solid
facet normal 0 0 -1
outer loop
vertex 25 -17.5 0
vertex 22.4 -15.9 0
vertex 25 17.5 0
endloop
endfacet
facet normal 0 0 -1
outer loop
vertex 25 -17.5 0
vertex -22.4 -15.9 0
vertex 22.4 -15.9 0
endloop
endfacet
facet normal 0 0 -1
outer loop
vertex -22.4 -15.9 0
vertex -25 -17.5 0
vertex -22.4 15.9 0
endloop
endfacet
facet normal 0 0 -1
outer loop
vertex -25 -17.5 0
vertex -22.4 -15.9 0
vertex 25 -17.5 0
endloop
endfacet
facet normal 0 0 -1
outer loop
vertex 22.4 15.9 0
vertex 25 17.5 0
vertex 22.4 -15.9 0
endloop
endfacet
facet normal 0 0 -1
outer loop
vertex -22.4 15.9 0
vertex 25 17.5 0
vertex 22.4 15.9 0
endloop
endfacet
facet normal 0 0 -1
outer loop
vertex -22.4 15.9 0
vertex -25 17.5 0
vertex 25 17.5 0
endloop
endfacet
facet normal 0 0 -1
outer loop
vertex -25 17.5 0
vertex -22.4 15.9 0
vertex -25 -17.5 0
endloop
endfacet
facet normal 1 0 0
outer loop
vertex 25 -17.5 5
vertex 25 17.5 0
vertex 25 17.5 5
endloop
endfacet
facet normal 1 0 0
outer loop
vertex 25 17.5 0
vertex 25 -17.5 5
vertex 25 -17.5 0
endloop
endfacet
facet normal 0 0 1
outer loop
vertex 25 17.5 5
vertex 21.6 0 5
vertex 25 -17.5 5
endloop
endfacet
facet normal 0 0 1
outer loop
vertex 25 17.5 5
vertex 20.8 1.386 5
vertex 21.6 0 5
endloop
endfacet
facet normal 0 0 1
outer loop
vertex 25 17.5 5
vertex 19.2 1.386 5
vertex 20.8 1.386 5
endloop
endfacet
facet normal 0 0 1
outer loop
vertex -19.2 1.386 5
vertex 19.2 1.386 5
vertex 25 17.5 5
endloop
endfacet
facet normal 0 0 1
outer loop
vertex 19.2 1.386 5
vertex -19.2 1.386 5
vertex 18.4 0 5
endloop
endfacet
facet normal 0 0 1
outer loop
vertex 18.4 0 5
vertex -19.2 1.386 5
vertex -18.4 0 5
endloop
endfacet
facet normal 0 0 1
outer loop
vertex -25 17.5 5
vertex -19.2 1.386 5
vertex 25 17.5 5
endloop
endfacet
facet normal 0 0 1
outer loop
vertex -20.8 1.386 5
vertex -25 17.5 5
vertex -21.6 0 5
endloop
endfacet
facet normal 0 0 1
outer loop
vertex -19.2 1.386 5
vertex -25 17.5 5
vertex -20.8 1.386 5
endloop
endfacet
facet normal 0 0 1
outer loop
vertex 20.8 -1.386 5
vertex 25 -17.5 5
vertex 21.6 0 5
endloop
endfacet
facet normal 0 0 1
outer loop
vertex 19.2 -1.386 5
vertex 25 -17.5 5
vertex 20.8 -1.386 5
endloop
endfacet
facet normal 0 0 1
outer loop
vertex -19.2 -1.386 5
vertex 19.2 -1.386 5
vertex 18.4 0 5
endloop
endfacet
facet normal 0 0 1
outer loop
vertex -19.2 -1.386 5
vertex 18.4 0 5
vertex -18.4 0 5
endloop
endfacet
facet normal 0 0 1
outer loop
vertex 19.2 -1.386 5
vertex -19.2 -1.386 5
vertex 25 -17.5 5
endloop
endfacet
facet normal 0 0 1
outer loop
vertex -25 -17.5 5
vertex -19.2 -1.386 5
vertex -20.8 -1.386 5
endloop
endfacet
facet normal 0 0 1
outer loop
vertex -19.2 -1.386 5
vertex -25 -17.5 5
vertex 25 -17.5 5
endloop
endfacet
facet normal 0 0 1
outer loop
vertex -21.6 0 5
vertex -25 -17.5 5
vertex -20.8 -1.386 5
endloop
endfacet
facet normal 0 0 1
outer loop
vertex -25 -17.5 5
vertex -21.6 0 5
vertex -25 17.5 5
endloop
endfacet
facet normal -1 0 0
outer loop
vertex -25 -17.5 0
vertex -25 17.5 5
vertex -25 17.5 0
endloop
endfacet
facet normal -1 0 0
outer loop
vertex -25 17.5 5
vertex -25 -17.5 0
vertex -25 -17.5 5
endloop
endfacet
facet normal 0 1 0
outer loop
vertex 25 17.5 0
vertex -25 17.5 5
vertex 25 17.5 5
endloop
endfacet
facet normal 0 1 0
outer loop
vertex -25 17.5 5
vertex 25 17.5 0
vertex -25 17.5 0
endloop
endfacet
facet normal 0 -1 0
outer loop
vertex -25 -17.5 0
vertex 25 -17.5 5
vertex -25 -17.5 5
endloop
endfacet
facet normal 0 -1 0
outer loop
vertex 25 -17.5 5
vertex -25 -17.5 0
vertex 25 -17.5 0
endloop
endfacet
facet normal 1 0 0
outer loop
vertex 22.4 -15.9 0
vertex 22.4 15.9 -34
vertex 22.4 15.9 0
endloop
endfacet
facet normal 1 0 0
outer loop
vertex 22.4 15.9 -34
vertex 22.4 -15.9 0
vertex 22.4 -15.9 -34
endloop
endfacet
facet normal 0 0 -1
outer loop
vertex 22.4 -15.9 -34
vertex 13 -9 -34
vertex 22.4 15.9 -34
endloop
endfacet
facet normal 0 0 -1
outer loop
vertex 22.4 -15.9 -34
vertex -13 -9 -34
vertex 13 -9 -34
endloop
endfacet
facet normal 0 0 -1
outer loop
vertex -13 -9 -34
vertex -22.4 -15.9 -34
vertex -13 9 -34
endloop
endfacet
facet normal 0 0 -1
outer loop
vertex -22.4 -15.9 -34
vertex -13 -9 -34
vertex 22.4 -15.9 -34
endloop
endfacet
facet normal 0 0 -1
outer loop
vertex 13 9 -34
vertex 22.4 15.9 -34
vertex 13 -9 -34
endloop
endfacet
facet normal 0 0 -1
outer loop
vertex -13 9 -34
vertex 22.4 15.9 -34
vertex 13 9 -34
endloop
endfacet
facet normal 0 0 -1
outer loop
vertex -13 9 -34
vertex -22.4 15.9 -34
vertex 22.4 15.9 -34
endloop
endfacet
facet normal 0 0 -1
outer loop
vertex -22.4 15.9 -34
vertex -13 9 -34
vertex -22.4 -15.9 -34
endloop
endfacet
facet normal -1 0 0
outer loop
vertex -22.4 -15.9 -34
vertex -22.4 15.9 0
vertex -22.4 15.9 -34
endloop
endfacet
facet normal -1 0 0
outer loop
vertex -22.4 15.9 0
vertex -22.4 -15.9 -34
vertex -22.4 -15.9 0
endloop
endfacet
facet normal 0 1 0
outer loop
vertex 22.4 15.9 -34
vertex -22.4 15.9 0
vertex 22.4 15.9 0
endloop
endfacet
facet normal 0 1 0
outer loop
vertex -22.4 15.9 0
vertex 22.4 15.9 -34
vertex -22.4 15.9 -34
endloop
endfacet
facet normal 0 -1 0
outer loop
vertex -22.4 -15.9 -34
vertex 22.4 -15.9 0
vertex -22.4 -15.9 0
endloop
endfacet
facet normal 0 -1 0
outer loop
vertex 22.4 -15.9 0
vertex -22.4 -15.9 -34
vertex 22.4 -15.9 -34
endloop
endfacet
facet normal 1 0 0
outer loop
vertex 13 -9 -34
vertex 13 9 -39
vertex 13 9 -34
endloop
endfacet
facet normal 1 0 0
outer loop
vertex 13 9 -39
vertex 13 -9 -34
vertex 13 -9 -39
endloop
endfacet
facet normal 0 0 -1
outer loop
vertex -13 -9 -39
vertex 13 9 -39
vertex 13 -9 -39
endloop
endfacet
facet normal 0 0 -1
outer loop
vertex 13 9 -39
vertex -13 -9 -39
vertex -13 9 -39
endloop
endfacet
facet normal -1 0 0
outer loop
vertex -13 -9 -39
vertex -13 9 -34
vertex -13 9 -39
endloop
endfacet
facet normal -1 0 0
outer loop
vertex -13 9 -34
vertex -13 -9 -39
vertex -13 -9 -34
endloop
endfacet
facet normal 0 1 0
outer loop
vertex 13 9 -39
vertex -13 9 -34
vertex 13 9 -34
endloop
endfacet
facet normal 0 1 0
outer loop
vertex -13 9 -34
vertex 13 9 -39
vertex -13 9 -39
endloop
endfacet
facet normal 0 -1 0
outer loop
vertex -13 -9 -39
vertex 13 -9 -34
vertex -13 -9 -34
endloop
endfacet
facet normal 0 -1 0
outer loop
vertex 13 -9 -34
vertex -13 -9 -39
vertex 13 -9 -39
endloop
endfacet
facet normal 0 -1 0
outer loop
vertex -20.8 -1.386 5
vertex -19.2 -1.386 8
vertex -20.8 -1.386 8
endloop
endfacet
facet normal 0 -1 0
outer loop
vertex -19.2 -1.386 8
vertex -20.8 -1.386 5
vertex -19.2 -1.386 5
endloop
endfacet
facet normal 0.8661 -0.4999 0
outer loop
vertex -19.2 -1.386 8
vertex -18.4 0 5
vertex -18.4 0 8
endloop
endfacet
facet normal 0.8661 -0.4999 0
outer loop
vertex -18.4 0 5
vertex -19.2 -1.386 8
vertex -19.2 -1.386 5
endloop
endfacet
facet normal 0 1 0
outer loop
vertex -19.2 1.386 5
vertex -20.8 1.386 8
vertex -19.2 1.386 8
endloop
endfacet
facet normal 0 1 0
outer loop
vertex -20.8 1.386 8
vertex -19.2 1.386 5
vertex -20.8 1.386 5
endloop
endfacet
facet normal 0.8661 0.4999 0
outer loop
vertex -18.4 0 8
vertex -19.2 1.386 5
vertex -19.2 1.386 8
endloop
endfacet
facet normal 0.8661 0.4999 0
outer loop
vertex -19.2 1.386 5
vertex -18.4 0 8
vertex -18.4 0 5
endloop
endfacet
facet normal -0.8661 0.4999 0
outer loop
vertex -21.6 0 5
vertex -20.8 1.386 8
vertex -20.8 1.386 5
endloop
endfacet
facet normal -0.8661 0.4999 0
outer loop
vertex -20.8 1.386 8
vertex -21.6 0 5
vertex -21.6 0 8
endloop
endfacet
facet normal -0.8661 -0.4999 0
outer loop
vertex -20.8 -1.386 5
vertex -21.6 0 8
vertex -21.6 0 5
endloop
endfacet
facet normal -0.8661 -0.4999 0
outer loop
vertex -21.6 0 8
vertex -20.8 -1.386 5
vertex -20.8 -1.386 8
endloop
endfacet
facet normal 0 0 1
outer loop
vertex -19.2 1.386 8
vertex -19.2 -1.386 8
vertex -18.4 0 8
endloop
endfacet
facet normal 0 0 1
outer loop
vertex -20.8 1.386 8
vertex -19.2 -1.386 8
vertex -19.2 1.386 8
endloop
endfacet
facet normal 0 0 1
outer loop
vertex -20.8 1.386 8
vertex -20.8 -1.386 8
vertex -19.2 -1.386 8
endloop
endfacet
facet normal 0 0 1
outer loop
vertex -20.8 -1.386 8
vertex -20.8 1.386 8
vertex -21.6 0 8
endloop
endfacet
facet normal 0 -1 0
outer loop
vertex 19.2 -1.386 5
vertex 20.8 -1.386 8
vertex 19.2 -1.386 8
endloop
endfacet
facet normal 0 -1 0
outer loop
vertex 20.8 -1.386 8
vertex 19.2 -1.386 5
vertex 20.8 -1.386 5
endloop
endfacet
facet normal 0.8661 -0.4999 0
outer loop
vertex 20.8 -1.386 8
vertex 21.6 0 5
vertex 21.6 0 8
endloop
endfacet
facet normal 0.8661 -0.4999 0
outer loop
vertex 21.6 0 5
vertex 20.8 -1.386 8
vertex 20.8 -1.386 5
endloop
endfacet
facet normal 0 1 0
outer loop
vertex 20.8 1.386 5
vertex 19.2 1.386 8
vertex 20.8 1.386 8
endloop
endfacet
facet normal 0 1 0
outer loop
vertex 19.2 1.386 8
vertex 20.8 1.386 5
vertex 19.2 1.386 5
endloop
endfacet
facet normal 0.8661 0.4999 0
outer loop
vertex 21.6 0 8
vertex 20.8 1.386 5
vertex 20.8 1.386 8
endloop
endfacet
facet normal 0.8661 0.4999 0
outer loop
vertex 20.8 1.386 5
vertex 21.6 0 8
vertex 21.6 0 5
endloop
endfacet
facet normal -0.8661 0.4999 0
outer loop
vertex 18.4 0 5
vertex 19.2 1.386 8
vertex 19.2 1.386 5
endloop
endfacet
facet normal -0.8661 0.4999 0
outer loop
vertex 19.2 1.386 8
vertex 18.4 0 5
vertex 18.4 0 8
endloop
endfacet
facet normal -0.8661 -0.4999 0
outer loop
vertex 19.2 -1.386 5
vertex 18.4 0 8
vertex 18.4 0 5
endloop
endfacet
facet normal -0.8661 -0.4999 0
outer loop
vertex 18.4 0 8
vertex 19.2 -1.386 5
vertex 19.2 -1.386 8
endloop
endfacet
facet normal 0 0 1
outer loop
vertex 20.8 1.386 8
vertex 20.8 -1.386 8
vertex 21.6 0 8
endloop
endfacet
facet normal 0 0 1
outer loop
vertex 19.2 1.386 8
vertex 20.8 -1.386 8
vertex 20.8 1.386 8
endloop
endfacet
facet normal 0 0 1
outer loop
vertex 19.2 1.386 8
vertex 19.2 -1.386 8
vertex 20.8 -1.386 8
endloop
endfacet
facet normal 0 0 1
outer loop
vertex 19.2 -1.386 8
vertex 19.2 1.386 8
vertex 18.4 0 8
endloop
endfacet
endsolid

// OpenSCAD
// Parameters
cutout_width_mm = 40.0; //[20.0:80.0:0.5]
cutout_height_mm = 27.0; //[13.5:54.0:0.5]
panel_thickness_mm = 2.0; //[1.0:4.0:0.25]
fit_clearance_mm = 0.4; //[0.1:1.0:0.05]
overlap_mm = 1.0; //[0.5:2.0:0.1]
flange_width_mm = 50.0; //[40.0:80.0:0.5]
flange_height_mm = 35.0; //[27.0:70.0:0.5]
flange_thickness_mm = 3.0; //[1.5:6.0:0.25]
bezel_thickness_mm = 2.0; //[1.0:5.0:0.25]
bezel_radius_mm = 2.5; //[0.5:6.0:0.25]
body_depth_mm = 28.0; //[14.0:56.0:0.5]
body_wall_extra_mm = 2.0; //[1.0:5.0:0.25]
screw_hole_diameter_mm = 3.2; //[2.0:6.0:0.1]
screw_hole_pitch_mm = 40.0; //[25.0:70.0:0.5]
screw_hole_edge_margin_mm = 6.0; //[3.0:12.0:0.5]
terminal_clearance_width_mm = 26.0; //[15.0:45.0:0.5]
terminal_clearance_height_mm = 18.0; //[10.0:35.0:0.5]
terminal_clearance_depth_mm = 12.0; //[6.0:30.0:0.5]
rear_clearance_extra_depth_mm = 6.0; //[2.0:20.0:0.5]

// IEC Module - complete geometry
module iec() {
  color("Black") {
    // Body
    translate([0, 0, -(panel_thickness_mm/2 + (body_depth_mm + overlap_mm)/2 - overlap_mm)])
      cube([cutout_width_mm + 2*body_wall_extra_mm, cutout_height_mm + 2*body_wall_extra_mm, body_depth_mm + overlap_mm], center=true);
    // Front Flange Bezel
    translate([0, 0, (panel_thickness_mm/2 + (flange_thickness_mm + bezel_thickness_mm)/2 - overlap_mm)])
      cube([flange_width_mm, flange_height_mm, flange_thickness_mm + bezel_thickness_mm], center=true);
  }
}

// Mod Module - complete geometry
module mod() {
  color("DimGray") {
    // Rear Body Clearance Volume
    translate([0, 0, -(panel_thickness_mm/2 + (body_depth_mm + rear_clearance_extra_depth_mm)/2 - overlap_mm)])
      cube([cutout_width_mm + 2*(body_wall_extra_mm + fit_clearance_mm), cutout_height_mm + 2*(body_wall_extra_mm + fit_clearance_mm), body_depth_mm + rear_clearance_extra_depth_mm], center=true);
    // Spade Terminal Clearance
    translate([0, 0, -(panel_thickness_mm/2 + body_depth_mm - overlap_mm + terminal_clearance_depth_mm/2 - overlap_mm)])
      cube([terminal_clearance_width_mm, terminal_clearance_height_mm, terminal_clearance_depth_mm], center=true);
  }
}

// Assembly
module assembly() {
  // Panel Cutout
  color("Silver") translate([0, 0, 0])
    cube([cutout_width_mm + 2*fit_clearance_mm, cutout_height_mm + 2*fit_clearance_mm, panel_thickness_mm + 2*overlap_mm], center=true);
  
  // IEC Inlet with Flange and Bezel
  iec();
  
  // Mod with Rear Body and Terminal Clearance
  mod();
  
  // Mounting Screw Holes
  color("Silver") {
    translate([-(screw_hole_pitch_mm/2), 0, (panel_thickness_mm/2 + (flange_thickness_mm + bezel_thickness_mm)/2 - overlap_mm)])
      cylinder(r=screw_hole_diameter_mm/2, h=flange_thickness_mm + bezel_thickness_mm + panel_thickness_mm + 4*overlap_mm, center=true);
    translate([(screw_hole_pitch_mm/2), 0, (panel_thickness_mm/2 + (flange_thickness_mm + bezel_thickness_mm)/2 - overlap_mm)])
      cylinder(r=screw_hole_diameter_mm/2, h=flange_thickness_mm + bezel_thickness_mm + panel_thickness_mm + 4*overlap_mm, center=true);
  }
}

assembly();
